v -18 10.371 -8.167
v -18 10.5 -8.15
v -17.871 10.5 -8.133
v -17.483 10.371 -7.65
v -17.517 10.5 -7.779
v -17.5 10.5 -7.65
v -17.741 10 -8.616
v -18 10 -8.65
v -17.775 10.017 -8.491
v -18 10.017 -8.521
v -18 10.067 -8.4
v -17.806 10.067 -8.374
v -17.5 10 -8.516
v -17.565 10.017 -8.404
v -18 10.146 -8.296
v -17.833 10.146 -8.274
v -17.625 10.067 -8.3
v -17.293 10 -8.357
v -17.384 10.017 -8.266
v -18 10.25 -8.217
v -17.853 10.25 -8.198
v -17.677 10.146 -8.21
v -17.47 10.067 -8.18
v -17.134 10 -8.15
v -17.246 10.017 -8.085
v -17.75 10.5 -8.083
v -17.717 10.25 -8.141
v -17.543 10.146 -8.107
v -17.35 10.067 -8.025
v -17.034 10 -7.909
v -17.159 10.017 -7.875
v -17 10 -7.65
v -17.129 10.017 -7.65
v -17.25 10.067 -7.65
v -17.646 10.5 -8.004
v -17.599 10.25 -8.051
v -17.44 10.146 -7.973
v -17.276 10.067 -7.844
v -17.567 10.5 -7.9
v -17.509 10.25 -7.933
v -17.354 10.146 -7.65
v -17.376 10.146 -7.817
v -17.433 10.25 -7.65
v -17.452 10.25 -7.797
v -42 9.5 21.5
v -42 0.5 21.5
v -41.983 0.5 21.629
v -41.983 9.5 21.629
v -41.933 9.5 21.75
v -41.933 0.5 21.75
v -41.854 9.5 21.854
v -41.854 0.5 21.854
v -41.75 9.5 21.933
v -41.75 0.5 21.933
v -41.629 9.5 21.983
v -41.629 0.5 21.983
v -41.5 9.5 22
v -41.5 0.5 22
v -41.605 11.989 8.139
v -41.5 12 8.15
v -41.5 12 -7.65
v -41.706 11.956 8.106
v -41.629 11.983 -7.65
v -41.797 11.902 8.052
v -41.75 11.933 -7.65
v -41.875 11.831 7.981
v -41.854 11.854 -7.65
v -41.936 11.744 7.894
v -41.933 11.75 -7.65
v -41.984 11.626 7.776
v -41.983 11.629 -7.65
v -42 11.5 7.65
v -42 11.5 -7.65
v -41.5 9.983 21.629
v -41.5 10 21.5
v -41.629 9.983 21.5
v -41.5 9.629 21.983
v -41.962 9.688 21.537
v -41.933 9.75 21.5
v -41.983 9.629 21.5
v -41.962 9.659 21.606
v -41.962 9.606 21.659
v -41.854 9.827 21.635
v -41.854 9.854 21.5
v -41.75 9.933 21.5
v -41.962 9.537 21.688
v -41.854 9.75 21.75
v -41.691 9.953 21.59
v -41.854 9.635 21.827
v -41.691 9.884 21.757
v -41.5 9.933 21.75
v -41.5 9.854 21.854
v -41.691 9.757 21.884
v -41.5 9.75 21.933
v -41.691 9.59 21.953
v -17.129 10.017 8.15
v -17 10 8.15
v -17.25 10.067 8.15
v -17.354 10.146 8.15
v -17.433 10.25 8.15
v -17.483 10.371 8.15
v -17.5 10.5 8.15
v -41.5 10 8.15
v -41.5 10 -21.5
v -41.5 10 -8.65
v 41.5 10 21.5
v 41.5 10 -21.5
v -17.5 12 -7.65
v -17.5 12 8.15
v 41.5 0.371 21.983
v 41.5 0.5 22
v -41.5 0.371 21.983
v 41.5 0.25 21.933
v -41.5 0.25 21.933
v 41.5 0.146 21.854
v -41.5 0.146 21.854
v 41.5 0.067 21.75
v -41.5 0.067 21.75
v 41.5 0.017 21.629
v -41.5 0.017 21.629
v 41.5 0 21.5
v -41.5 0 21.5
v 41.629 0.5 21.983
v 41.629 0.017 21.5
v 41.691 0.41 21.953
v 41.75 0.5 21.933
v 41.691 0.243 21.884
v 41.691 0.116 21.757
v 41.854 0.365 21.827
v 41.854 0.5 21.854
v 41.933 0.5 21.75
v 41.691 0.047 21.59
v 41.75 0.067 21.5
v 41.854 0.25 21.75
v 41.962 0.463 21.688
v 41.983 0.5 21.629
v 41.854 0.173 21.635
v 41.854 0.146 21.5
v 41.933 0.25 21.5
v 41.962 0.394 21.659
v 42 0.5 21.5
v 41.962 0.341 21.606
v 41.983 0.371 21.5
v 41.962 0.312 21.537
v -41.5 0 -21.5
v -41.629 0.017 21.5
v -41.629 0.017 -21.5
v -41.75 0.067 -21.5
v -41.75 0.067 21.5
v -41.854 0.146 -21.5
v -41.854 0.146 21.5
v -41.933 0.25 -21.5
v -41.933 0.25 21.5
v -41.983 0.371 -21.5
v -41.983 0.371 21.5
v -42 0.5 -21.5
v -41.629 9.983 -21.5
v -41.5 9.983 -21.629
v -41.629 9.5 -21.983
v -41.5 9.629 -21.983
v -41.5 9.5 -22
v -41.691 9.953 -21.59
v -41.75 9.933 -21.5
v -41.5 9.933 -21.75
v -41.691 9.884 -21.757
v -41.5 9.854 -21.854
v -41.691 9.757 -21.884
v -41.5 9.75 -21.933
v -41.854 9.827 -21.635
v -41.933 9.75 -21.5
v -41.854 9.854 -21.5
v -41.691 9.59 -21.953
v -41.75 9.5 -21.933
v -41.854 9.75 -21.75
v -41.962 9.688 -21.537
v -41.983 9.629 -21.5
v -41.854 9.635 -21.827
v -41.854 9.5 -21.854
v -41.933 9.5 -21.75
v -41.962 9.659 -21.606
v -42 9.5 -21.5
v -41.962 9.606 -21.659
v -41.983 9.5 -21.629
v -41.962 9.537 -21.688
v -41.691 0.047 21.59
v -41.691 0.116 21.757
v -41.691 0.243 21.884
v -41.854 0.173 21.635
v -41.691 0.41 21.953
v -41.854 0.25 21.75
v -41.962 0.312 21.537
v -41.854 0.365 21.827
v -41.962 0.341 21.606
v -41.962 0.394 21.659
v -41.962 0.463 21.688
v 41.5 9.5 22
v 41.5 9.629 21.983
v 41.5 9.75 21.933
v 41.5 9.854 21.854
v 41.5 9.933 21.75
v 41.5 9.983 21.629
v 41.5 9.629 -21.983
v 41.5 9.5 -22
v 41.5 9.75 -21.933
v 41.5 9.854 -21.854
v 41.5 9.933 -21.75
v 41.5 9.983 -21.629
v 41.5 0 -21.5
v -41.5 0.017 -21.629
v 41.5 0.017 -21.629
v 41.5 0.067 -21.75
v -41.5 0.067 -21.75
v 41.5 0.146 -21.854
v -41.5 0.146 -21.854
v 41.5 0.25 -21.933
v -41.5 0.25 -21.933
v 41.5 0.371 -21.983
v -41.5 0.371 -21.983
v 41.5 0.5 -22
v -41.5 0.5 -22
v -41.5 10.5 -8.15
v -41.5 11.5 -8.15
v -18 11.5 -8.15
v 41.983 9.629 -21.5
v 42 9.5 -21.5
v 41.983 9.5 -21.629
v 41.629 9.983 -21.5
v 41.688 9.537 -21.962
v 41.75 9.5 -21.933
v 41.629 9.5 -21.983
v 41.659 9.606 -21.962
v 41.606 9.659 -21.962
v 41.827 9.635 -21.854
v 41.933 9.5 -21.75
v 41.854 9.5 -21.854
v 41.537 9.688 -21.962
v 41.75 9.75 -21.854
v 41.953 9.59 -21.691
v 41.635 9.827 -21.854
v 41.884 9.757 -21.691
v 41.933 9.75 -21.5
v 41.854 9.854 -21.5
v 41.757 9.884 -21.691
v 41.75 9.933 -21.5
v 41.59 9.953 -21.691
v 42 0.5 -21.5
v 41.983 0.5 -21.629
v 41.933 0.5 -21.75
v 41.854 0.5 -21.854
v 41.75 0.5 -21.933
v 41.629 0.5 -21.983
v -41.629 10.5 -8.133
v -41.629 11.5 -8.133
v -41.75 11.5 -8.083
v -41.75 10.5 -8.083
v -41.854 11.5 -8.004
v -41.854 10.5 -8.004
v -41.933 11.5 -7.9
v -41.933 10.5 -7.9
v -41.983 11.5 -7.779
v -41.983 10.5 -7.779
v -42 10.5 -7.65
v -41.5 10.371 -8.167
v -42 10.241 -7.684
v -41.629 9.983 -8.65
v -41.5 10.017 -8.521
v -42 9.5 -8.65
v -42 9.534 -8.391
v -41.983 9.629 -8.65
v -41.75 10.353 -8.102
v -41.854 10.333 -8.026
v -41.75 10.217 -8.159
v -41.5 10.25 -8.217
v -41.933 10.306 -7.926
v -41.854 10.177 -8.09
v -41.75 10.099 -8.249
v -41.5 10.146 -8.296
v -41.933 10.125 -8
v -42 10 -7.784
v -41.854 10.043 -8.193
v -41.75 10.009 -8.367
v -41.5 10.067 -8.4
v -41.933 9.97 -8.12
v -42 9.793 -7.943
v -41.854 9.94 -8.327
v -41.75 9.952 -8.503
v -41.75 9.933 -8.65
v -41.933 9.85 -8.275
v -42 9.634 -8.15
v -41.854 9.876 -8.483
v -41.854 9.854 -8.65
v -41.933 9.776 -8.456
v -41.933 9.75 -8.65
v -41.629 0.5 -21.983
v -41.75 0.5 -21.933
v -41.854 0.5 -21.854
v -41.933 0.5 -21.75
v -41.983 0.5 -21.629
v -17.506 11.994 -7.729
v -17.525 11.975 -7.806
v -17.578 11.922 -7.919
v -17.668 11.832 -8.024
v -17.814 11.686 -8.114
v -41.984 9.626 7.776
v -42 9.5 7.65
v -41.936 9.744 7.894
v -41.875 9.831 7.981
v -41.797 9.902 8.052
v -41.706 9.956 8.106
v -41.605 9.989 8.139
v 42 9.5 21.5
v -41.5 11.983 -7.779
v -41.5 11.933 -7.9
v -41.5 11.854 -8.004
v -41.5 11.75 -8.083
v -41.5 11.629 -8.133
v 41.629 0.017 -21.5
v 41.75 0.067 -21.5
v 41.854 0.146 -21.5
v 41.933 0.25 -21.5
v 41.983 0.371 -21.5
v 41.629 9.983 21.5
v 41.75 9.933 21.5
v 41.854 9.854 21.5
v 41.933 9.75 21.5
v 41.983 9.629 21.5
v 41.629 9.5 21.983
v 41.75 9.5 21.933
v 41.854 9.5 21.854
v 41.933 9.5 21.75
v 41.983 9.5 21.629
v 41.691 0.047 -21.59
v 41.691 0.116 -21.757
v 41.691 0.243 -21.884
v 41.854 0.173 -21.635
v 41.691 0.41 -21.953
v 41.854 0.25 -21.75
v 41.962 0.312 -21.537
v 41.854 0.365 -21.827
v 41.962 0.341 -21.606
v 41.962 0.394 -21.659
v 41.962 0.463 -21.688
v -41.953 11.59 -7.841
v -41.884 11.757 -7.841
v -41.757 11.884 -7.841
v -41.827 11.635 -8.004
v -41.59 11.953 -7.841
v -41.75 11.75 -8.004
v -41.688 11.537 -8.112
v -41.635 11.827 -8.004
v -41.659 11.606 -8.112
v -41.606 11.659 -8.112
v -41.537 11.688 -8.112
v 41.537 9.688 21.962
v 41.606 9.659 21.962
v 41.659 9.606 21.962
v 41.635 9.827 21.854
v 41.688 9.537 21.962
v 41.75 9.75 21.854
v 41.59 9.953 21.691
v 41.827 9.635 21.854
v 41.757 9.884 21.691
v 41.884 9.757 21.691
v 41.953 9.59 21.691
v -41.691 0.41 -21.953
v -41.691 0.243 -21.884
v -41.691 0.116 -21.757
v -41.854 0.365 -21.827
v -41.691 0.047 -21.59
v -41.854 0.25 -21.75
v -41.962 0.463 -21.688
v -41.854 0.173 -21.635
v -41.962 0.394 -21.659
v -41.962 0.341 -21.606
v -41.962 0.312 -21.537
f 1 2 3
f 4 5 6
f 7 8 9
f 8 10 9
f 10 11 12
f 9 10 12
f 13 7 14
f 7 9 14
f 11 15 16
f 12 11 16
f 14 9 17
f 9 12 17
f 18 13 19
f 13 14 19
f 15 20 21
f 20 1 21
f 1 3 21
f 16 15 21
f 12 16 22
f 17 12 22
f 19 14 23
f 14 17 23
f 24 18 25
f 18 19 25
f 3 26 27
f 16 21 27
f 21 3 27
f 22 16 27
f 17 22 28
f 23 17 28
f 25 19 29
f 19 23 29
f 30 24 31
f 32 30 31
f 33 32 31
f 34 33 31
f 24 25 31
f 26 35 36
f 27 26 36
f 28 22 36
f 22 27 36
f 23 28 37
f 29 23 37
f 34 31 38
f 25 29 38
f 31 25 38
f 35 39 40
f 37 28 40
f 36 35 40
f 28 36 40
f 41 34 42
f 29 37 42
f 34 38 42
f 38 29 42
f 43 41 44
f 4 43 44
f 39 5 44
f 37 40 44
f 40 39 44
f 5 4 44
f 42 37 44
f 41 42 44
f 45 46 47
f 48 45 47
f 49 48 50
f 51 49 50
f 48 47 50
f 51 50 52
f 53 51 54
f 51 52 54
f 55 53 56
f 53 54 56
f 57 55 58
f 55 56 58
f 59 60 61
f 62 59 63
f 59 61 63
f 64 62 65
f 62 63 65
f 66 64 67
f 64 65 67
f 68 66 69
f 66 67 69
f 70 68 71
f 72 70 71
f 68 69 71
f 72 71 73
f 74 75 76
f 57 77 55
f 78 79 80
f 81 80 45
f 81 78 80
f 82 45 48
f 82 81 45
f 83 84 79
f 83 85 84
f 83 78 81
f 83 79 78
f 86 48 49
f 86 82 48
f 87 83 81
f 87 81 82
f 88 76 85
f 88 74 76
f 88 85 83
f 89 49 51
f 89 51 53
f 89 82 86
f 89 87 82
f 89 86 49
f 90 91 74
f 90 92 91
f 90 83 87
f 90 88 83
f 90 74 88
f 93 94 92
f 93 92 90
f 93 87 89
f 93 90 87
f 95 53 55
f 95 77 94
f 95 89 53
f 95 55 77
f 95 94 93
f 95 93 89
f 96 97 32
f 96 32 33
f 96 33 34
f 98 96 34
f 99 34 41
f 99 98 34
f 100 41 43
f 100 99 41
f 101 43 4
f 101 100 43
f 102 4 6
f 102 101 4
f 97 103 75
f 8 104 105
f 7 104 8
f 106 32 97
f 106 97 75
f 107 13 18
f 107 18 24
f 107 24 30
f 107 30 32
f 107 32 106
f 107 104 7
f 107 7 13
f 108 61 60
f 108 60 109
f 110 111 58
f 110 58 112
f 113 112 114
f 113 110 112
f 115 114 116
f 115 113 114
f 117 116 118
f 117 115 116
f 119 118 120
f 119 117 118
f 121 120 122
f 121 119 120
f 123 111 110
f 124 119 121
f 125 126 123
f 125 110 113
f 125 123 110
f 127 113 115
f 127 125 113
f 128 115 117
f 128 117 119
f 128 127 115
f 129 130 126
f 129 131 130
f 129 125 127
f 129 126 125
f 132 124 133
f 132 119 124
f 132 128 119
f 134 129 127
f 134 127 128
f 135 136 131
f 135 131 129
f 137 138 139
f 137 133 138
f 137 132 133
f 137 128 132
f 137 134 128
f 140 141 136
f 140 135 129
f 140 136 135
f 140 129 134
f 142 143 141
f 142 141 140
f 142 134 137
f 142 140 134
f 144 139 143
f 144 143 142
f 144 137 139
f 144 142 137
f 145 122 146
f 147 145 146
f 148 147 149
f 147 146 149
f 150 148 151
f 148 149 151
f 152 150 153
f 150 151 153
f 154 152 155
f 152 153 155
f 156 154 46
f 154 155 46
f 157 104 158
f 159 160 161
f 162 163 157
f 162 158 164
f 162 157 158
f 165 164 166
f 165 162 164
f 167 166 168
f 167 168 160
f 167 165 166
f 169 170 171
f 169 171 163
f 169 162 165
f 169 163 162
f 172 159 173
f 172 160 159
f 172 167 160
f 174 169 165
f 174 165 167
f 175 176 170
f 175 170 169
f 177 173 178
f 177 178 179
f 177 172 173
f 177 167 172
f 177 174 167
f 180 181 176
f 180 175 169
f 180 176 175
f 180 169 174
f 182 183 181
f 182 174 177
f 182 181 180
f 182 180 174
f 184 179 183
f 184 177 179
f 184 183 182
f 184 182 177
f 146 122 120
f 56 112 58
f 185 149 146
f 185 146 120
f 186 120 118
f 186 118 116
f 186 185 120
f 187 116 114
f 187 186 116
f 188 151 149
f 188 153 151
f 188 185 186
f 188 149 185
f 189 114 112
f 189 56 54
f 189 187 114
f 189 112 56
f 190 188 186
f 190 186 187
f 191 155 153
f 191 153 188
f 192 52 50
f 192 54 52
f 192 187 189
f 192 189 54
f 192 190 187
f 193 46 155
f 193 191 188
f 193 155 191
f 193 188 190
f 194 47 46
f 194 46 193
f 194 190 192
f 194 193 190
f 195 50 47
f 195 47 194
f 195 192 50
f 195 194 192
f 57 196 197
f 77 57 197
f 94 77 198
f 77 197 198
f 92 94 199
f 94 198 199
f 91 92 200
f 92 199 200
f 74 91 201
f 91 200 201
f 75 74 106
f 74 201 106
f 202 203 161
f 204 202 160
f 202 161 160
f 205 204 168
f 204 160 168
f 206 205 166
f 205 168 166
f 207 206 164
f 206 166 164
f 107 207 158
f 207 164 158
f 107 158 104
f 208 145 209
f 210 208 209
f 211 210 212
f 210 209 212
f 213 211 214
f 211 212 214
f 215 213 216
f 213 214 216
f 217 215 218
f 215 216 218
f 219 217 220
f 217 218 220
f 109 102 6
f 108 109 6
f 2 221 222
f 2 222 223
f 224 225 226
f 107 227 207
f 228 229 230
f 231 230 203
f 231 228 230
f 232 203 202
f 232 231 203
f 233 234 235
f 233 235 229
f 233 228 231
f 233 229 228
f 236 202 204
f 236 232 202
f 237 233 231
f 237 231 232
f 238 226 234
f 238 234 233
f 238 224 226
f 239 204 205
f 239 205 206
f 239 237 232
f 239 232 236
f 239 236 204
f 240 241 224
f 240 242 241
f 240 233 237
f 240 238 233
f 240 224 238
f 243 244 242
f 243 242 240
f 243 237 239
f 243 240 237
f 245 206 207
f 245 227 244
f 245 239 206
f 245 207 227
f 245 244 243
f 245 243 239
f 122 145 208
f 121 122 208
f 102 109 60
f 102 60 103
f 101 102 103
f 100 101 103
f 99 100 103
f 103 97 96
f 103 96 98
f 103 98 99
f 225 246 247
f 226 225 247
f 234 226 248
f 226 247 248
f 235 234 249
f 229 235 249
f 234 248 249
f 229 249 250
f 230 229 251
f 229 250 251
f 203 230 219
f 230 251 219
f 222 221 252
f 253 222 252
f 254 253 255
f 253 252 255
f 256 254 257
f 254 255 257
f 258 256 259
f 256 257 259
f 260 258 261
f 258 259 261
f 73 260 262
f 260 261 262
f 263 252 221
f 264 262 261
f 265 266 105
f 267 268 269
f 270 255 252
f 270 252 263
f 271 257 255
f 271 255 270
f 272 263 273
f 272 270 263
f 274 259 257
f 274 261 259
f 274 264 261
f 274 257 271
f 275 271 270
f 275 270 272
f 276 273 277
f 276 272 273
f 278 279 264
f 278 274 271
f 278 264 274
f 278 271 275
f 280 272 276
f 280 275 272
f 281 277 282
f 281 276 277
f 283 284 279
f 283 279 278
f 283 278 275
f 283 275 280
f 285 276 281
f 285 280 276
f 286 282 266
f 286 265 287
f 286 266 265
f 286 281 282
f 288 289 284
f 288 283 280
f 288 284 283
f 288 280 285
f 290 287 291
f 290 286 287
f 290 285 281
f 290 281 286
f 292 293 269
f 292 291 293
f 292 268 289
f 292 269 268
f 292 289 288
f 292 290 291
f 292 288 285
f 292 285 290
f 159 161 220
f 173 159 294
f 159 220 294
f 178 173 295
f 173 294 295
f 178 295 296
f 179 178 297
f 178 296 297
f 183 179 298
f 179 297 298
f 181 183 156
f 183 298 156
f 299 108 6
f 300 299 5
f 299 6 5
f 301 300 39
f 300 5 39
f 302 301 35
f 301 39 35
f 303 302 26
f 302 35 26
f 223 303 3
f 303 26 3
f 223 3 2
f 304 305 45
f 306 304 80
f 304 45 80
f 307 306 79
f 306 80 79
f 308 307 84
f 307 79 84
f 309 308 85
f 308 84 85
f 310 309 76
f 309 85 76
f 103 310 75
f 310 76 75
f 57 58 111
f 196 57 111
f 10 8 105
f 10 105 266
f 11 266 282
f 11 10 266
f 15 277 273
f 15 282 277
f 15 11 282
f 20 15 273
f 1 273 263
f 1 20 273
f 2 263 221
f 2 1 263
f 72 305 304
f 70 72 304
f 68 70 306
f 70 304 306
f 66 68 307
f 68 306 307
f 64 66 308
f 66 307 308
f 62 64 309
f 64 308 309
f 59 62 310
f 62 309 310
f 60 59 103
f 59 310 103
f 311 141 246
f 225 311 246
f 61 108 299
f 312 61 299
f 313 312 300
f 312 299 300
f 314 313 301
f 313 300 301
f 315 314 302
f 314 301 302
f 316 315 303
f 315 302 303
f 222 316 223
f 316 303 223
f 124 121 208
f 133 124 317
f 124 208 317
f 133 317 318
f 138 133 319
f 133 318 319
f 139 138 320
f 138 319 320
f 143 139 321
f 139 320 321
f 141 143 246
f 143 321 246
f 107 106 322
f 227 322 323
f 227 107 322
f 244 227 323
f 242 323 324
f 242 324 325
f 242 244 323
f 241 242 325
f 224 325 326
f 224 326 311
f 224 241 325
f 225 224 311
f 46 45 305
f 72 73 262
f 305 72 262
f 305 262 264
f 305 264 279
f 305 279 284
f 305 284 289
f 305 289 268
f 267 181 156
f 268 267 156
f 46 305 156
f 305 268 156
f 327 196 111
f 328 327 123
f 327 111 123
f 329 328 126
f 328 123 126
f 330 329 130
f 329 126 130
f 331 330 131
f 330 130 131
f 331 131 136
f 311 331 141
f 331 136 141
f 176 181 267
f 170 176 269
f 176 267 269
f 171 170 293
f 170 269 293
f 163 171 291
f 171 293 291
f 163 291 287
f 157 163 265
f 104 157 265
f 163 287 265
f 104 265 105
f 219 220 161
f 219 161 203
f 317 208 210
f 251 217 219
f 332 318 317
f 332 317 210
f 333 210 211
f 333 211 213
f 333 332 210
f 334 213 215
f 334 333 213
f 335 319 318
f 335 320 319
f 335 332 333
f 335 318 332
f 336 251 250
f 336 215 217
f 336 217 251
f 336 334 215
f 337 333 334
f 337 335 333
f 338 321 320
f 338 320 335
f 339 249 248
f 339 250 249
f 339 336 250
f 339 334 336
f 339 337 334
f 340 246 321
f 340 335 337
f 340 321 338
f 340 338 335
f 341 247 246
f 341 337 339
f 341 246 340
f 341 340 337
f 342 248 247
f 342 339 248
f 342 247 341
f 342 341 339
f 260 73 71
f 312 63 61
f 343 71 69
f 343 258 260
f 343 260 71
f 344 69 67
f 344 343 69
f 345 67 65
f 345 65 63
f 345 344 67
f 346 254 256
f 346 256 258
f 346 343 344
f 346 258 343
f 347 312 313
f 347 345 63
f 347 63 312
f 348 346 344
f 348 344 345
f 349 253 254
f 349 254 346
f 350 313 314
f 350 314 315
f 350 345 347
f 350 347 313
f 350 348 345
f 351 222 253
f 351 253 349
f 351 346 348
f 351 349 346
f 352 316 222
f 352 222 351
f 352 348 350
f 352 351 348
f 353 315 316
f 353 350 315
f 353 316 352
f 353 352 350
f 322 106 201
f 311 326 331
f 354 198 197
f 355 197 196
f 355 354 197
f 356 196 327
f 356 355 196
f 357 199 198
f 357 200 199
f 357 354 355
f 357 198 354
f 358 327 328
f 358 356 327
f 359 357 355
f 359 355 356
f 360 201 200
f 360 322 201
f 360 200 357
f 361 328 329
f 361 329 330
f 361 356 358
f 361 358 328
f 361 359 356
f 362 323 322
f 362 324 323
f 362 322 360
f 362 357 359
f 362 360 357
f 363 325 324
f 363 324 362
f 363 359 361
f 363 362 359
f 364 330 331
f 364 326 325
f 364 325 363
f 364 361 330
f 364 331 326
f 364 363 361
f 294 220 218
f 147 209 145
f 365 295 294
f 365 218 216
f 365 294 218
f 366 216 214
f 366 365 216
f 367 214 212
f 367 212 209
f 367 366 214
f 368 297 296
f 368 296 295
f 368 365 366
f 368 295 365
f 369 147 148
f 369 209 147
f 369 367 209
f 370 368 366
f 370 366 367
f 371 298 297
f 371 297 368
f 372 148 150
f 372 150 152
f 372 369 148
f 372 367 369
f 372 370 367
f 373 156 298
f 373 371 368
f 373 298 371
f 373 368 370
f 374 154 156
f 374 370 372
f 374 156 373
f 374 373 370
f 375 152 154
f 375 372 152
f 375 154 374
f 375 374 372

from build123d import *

# Parameters (mm, degrees)
SKETCH_1_W      = 84
SKETCH_1_H      = 44
EXTRUDE_1_DEPTH = 10
SKETCH_3_W      = 24.5
SKETCH_3_H      = 16.3
EXTRUDE_2_DEPTH = 2
FILLET_1_R      = 0.5
FILLET_2_R      = 0.5
FILLET_3_R      = 0.5


with BuildPart() as part:
    # 草图1 → 凸台-拉伸1 (new body)
    with BuildSketch(Plane(origin=(0, 0, 0), x_dir=(1, 0, 0), z_dir=(0, 1, 0))):
        Rectangle(SKETCH_1_W, SKETCH_1_H)
    extrude(amount=EXTRUDE_1_DEPTH)

    # 草图3 → 凸台-拉伸2 (add)
    with BuildSketch(Plane(origin=(0, 10, 0), x_dir=(1, 0, 0), z_dir=(0, 1, 0))):
        with Locations((-29.75, 0)):
            Rectangle(SKETCH_3_W, SKETCH_3_H)
    extrude(amount=EXTRUDE_2_DEPTH)

    # 圆角1
    fillet_1_edges = [part.edges().sort_by_distance(p)[0] for p in [
        (42, 10, 0),
    ]]
    fillet(fillet_1_edges, radius=FILLET_1_R)

    # 圆角2
    fillet_2_edges = [part.edges().sort_by_distance(p)[0] for p in [
        (-0.25, 10, 22),
        (42, 4.75, 22),
        (41.853553391, 9.853553391, 22),
        (0, 0, 22),
    ]]
    fillet(fillet_2_edges, radius=FILLET_2_R)

    # 圆角3
    # the kernel refuses this fillet: 0.5 mm, written as the material it takes off along each edge
    with BuildSketch(Plane(origin=(41.5, 0.5, 21.5), x_dir=(0, -1, 0), z_dir=(1, 0, 0))) as fillet_3_piece_1_section:
        Polygon((0, 0), (FILLET_3_R, 0), (FILLET_3_R, -FILLET_3_R), (0, -FILLET_3_R), align=None)
    fillet_3_piece_1 = extrude(amount=FILLET_3_R, mode=Mode.PRIVATE)
    fillet_3_piece_1 = fillet_3_piece_1 - Plane(origin=(41.5, 0.5, 21.5), x_dir=(0, 0.7071067811865475, -0.7071067811865475), z_dir=(1, 0, 0)) * Sphere(FILLET_3_R, mode=Mode.PRIVATE)
    add(fillet_3_piece_1, mode=Mode.SUBTRACT)
    with BuildSketch(Plane(origin=(41.5, 0.5, -21.5), x_dir=(0, 0, -1), z_dir=(1, 0, 0))) as fillet_3_piece_2_section:
        Polygon((0, 0), (FILLET_3_R, 0), (FILLET_3_R, -FILLET_3_R), (0, -FILLET_3_R), align=None)
    fillet_3_piece_2 = extrude(amount=FILLET_3_R, mode=Mode.PRIVATE)
    fillet_3_piece_2 = fillet_3_piece_2 - Plane(origin=(41.5, 0.5, -21.5), x_dir=(0, 0.7071067811865475, 0.7071067811865475), z_dir=(1, 0, 0)) * Sphere(FILLET_3_R, mode=Mode.PRIVATE)
    add(fillet_3_piece_2, mode=Mode.SUBTRACT)
    with BuildSketch(Plane(origin=(-41.5, 0.5, -21.5), x_dir=(0, 0, -1), z_dir=(-1, 0, 0))) as fillet_3_piece_3_section:
        Polygon((0, 0), (FILLET_3_R, 0), (FILLET_3_R, FILLET_3_R), (0, FILLET_3_R), align=None)
    fillet_3_piece_3 = extrude(amount=FILLET_3_R, mode=Mode.PRIVATE)
    fillet_3_piece_3 = fillet_3_piece_3 - Plane(origin=(-41.5, 0.5, -21.5), x_dir=(0, 0.7071067811865475, 0.7071067811865475), z_dir=(-1, 0, 0)) * Sphere(FILLET_3_R, mode=Mode.PRIVATE)
    add(fillet_3_piece_3, mode=Mode.SUBTRACT)
    with BuildSketch(Plane(origin=(-42, 10, 21.5), x_dir=(1, 0, 0), z_dir=(0, 0, -1))) as fillet_3_piece_4:
        with BuildLine():
            CenterArc((FILLET_3_R, FILLET_3_R), FILLET_3_R, 180, 90)
            Line((0, FILLET_3_R), (0, 0))
            Line((0, 0), (FILLET_3_R, 0))
        make_face()
    extrude(amount=13.35, mode=Mode.SUBTRACT)
    with BuildSketch(Plane(origin=(-42, 10, 8.15), x_dir=(0, 0, -1), z_dir=(0, 1, 0))) as fillet_3_piece_5:
        with BuildLine():
            CenterArc((FILLET_3_R, -FILLET_3_R), FILLET_3_R, 90, 90)
            Line((0, -FILLET_3_R), (0, 0))
            Line((0, 0), (FILLET_3_R, 0))
        make_face()
    extrude(amount=3.25, mode=Mode.SUBTRACT)
    with BuildSketch(Plane(origin=(-17.5, 10, -8.15), x_dir=(-1, 0, 0), z_dir=(0, 1, 0))) as fillet_3_piece_6:
        with BuildLine():
            CenterArc((FILLET_3_R, FILLET_3_R), FILLET_3_R, 180, 90)
            Line((0, FILLET_3_R), (0, 0))
            Line((0, 0), (FILLET_3_R, 0))
        make_face()
    extrude(amount=3.25, mode=Mode.SUBTRACT)
    with BuildSketch(Plane(origin=(-42, 12, -9.4), x_dir=(0, -1, 0), z_dir=(0, 0, 1))) as fillet_3_piece_7:
        with BuildLine():
            CenterArc((FILLET_3_R, FILLET_3_R), FILLET_3_R, 180, 90)
            Line((0, FILLET_3_R), (0, 0))
            Line((0, 0), (FILLET_3_R, 0))
        make_face()
    extrude(amount=18.8, mode=Mode.SUBTRACT)
    with BuildSketch(Plane(origin=(-16.25, 12, -8.15), x_dir=(0, -1, 0), z_dir=(-1, 0, 0))) as fillet_3_piece_8:
        with BuildLine():
            CenterArc((FILLET_3_R, FILLET_3_R), FILLET_3_R, 180, 90)
            Line((0, FILLET_3_R), (0, 0))
            Line((0, 0), (FILLET_3_R, 0))
        make_face()
    extrude(amount=27, mode=Mode.SUBTRACT)
    with BuildSketch(Plane(origin=(-43.25, 10, -22), x_dir=(0, -1, 0), z_dir=(1, 0, 0))) as fillet_3_piece_9:
        with BuildLine():
            CenterArc((FILLET_3_R, -FILLET_3_R), FILLET_3_R, 90, 90)
            Line((0, -FILLET_3_R), (0, 0))
            Line((0, 0), (FILLET_3_R, 0))
        make_face()
    extrude(amount=84.75, mode=Mode.SUBTRACT)
    with BuildSketch(Plane(origin=(42, 0.5, -22), x_dir=(0, 0, 1), z_dir=(0, 1, 0))) as fillet_3_piece_10:
        with BuildLine():
            CenterArc((FILLET_3_R, -FILLET_3_R), FILLET_3_R, 90, 90)
            Line((0, -FILLET_3_R), (0, 0))
            Line((0, 0), (FILLET_3_R, 0))
        make_face()
    extrude(amount=9, mode=Mode.SUBTRACT)
    with BuildSketch(Plane(origin=(41.5, 9.5, -22), x_dir=(1, 0, 0), z_dir=(0, -1, 0))) as fillet_3_piece_11:
        with BuildLine():
            CenterArc((0.5 - FILLET_3_R, FILLET_3_R), FILLET_3_R, 270, 90)
            Line((0.5 - FILLET_3_R, 0), (0.5, 0))
            Line((0.5, 0), (0.5, FILLET_3_R))
        make_face()
    revolve(axis=Axis((41.5, 9.5, -22), (0, 0, 1)), revolution_arc=90, mode=Mode.SUBTRACT)
    with BuildSketch(Plane(origin=(42, 0, -21.5), x_dir=(0, 1, 0), z_dir=(0, 0, 1))) as fillet_3_piece_12:
        with BuildLine():
            CenterArc((FILLET_3_R, FILLET_3_R), FILLET_3_R, 180, 90)
            Line((0, FILLET_3_R), (0, 0))
            Line((0, 0), (FILLET_3_R, 0))
        make_face()
    extrude(amount=43, mode=Mode.SUBTRACT)
    with BuildSketch(Plane(origin=(-42, 0.5, 22), x_dir=(1, 0, 0), z_dir=(0, 1, 0))) as fillet_3_piece_13:
        with BuildLine():
            CenterArc((FILLET_3_R, FILLET_3_R), FILLET_3_R, 180, 90)
            Line((0, FILLET_3_R), (0, 0))
            Line((0, 0), (FILLET_3_R, 0))
        make_face()
    extrude(amount=9, mode=Mode.SUBTRACT)
    with BuildSketch(Plane(origin=(-42, 0.5, 21.5), x_dir=(0, -1, 0), z_dir=(0, 0, -1))) as fillet_3_piece_14:
        with BuildLine():
            CenterArc((0.5 - FILLET_3_R, -FILLET_3_R), FILLET_3_R, 0, 90)
            Line((0.5 - FILLET_3_R, 0), (0.5, 0))
            Line((0.5, 0), (0.5, -FILLET_3_R))
        make_face()
    revolve(axis=Axis((-42, 0.5, 21.5), (-1, 0, 0)), revolution_arc=90, mode=Mode.SUBTRACT)
    with BuildSketch(Plane(origin=(-42, 9.5, 21.5), x_dir=(0, 1, 0), z_dir=(0, 0, -1))) as fillet_3_piece_15:
        with BuildLine():
            CenterArc((0.5 - FILLET_3_R, FILLET_3_R), FILLET_3_R, 270, 90)
            Line((0.5, FILLET_3_R), (0.5, 0))
            Line((0.5, 0), (0.5 - FILLET_3_R, 0))
        make_face()
    revolve(axis=Axis((-42, 9.5, 21.5), (1, 0, 0)), revolution_arc=90, mode=Mode.SUBTRACT)
    with BuildSketch(Plane(origin=(-42, 0, 21.5), x_dir=(1, 0, 0), z_dir=(0, 0, -1))) as fillet_3_piece_16:
        with BuildLine():
            CenterArc((FILLET_3_R, -FILLET_3_R), FILLET_3_R, 90, 90)
            Line((0, -FILLET_3_R), (0, 0))
            Line((0, 0), (FILLET_3_R, 0))
        make_face()
    extrude(amount=43, mode=Mode.SUBTRACT)
    with BuildSketch(Plane(origin=(-41.5, 0, -22), x_dir=(0, 1, 0), z_dir=(1, 0, 0))) as fillet_3_piece_17:
        with BuildLine():
            CenterArc((FILLET_3_R, FILLET_3_R), FILLET_3_R, 180, 90)
            Line((0, FILLET_3_R), (0, 0))
            Line((0, 0), (FILLET_3_R, 0))
        make_face()
    extrude(amount=83, mode=Mode.SUBTRACT)
    with BuildSketch(Plane(origin=(-42, 0.5, -22), x_dir=(1, 0, 0), z_dir=(0, 1, 0))) as fillet_3_piece_18:
        with BuildLine():
            CenterArc((FILLET_3_R, -FILLET_3_R), FILLET_3_R, 90, 90)
            Line((0, -FILLET_3_R), (0, 0))
            Line((0, 0), (FILLET_3_R, 0))
        make_face()
    extrude(amount=10.75, mode=Mode.SUBTRACT)
    with BuildSketch(Plane(origin=(-42, 10, 21.5), x_dir=(1, 0, 0), z_dir=(0, 0, -1))) as fillet_3_piece_19a_section:
        with BuildLine():
            CenterArc((FILLET_3_R, FILLET_3_R), FILLET_3_R, 180, 90)
            Line((0, FILLET_3_R), (0, 0))
            Line((0, 0), (FILLET_3_R, 0))
        make_face()
    fillet_3_piece_19a = extrude(amount=14.6, mode=Mode.PRIVATE)
    fillet_3_piece_19a = split(fillet_3_piece_19a, bisect_by=Plane(origin=(-41.886802443, 9.886802443, 8.15), z_dir=(0, 0, -1)), keep=Keep.TOP, mode=Mode.PRIVATE)
    with BuildSketch(Plane(origin=(-42, 8.75, 8.15), x_dir=(0, 0, -1), z_dir=(0, 1, 0))) as fillet_3_piece_19b_section:
        with BuildLine():
            CenterArc((FILLET_3_R, -FILLET_3_R), FILLET_3_R, 90, 90)
            Line((0, -FILLET_3_R), (0, 0))
            Line((0, 0), (FILLET_3_R, 0))
        make_face()
    fillet_3_piece_19b = extrude(amount=4.5, mode=Mode.PRIVATE)
    fillet_3_piece_19b = split(fillet_3_piece_19b, bisect_by=Plane(origin=(-41.886802443, 10, 8.036802443), z_dir=(0, -1, 0)), keep=Keep.TOP, mode=Mode.PRIVATE)
    fillet_3_piece_19 = fillet_3_piece_19a & fillet_3_piece_19b
    add(fillet_3_piece_19, mode=Mode.SUBTRACT)
    # the kernel refuses this fillet: 0.5 mm, written as the material it adds along each edge
    with BuildSketch(Plane(origin=(-17.5, 10, 8.15), x_dir=(0, 1, 0), z_dir=(0, 0, -1))) as fillet_3_2_piece_1:
        with BuildLine():
            CenterArc((FILLET_3_R, FILLET_3_R), FILLET_3_R, 180, 90)
            Line((0, FILLET_3_R), (0, 0))
            Line((0, 0), (FILLET_3_R, 0))
        make_face()
    extrude(amount=15.8)
    with BuildSketch(Plane(origin=(-18, 10, -8.15), x_dir=(0, 1, 0), z_dir=(-1, 0, 0))) as fillet_3_2_piece_2:
        with BuildLine():
            CenterArc((FILLET_3_R, FILLET_3_R), FILLET_3_R, 180, 90)
            Line((0, FILLET_3_R), (0, 0))
            Line((0, 0), (FILLET_3_R, 0))
        make_face()
    extrude(amount=24)
    with BuildSketch(Plane(origin=(-18, 10, -7.65), x_dir=(0, 0, -1), z_dir=(-1, 0, 0))) as fillet_3_2_piece_3:
        with BuildLine():
            CenterArc((0.5 + FILLET_3_R, -FILLET_3_R), FILLET_3_R, 90, 90)
            Line((0.5 + FILLET_3_R, 0), (0.5, 0))
            Line((0.5, 0), (0.5, -FILLET_3_R))
        make_face()
    revolve(axis=Axis((-18, 10, -7.65), (0, -1, 0)), revolution_arc=90)
    # the kernel refuses this fillet: 0.5 mm, written as the material it takes off along each edge
    with BuildSketch(Plane(origin=(-41.5, 11.5, -7.65), x_dir=(-1, 0, 0), z_dir=(0, 0, -1))) as fillet_3_3_piece_1_section:
        Polygon((0, 0), (FILLET_3_R, 0), (FILLET_3_R, FILLET_3_R), (0, FILLET_3_R), align=None)
    fillet_3_3_piece_1 = extrude(amount=FILLET_3_R, mode=Mode.PRIVATE)
    fillet_3_3_piece_1 = fillet_3_3_piece_1 - Plane(origin=(-41.5, 11.5, -7.65), x_dir=(0.7071067811865475, -0.7071067811865475, 0), z_dir=(0, 0, -1)) * Sphere(FILLET_3_R, mode=Mode.PRIVATE)
    add(fillet_3_3_piece_1, mode=Mode.SUBTRACT)
    with BuildSketch(Plane(origin=(-41.5, 9.5, -21.5), x_dir=(0, 1, 0), z_dir=(-1, 0, 0))) as fillet_3_3_piece_2_section:
        Polygon((0, 0), (FILLET_3_R, 0), (FILLET_3_R, FILLET_3_R), (0, FILLET_3_R), align=None)
    fillet_3_3_piece_2 = extrude(amount=FILLET_3_R, mode=Mode.PRIVATE)
    fillet_3_3_piece_2 = fillet_3_3_piece_2 - Plane(origin=(-41.5, 9.5, -21.5), x_dir=(0, -0.7071067811865475, 0.7071067811865475), z_dir=(-1, 0, 0)) * Sphere(FILLET_3_R, mode=Mode.PRIVATE)
    add(fillet_3_3_piece_2, mode=Mode.SUBTRACT)
    with BuildSketch(Plane(origin=(-42, 10, -8.65), x_dir=(0, -1, 0), z_dir=(0, 0, -1))) as fillet_3_3_piece_3:
        with BuildLine():
            CenterArc((FILLET_3_R, -FILLET_3_R), FILLET_3_R, 90, 90)
            Line((0, -FILLET_3_R), (0, 0))
            Line((0, 0), (FILLET_3_R, 0))
        make_face()
    extrude(amount=12.85, mode=Mode.SUBTRACT)
    with BuildSketch(Plane(origin=(-42, 10.5, -8.15), x_dir=(1, 0, 0), z_dir=(0, 1, 0))) as fillet_3_3_piece_4:
        with BuildLine():
            CenterArc((FILLET_3_R, -FILLET_3_R), FILLET_3_R, 90, 90)
            Line((0, -FILLET_3_R), (0, 0))
            Line((0, 0), (FILLET_3_R, 0))
        make_face()
    extrude(amount=1, mode=Mode.SUBTRACT)
    with BuildSketch(Plane(origin=(-42, 10.5, -8.65), x_dir=(0, 0, 1), z_dir=(0, 1, 0))) as fillet_3_3_piece_5:
        with BuildLine():
            CenterArc((0.5 + FILLET_3_R, FILLET_3_R), FILLET_3_R, 180, 90)
            Line((0.5 + FILLET_3_R, 0), (0.5, 0))
            Line((0.5, 0), (0.5, FILLET_3_R))
        make_face()
    revolve(axis=Axis((-42, 10.5, -8.65), (1, 0, 0)), revolution_arc=90, mode=Mode.SUBTRACT)


solid = part.part
